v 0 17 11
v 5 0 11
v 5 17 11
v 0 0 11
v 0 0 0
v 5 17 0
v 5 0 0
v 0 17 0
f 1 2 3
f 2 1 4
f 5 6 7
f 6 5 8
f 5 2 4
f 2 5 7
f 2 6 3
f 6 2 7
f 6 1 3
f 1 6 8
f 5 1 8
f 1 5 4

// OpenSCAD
// Generated by SolidPython 1.0.1 on 2020-07-29 00:46:54


cube(size = [5, 17, 11]);
/***********************************************
*********      SolidPython code:      **********
************************************************
 
# import packages: SolidPython
from solid import *
from solid.utils import *
from itertools import chain, combinations, permutations


class Resize:

    def __init__(self, scad_file):
        self.scad_file = scad_file
        #self.scad_file = import_scad(scad_file)
        # cone/cylinder param:
        self.r1 = 0
        self.r2 = 0
        self.h = 0
        # rectangular prism param:
        self.w = 0
        self.l = 0
        # ellipse param:
        self.r = 0

    # import OpenScad code (file name corresponds to shape)


    # classify shape + parameters
    def assign(self, param1, param2, param3):
        if self.scad_file == 'cone.scad':
            self.r1 = param1
            self.r2 = param2
            self.h = param3
        elif self.scad_file == 'cylinder.scad':
            self.r1 = param1
            self.r2 = param2
            self.h = param3
        elif self.scad_file == 'rectangularPrism.scad':
            self.h = param1
            self.l = param2
            self.w = param3
        else:
            self.r = param1
            self.h = param2

    # resize parameters
    def iterate(self):
        x = range(3, 20, 2)
        i = 1
        if self.scad_file == 'cone.scad':
            tempList = list(permutations(x, 2))
            for temp in tempList:
                param1 = temp[0]
                param2 = temp[1]
                filepath = 'produced_scad_files/' + 'cone' + str(param1) + '_' + str(param2) + '_' + '.scad'
                scad_render_to_file(cylinder(h=param1, r1=param2, r2=0), filepath)

        elif self.scad_file == 'cylinder.scad':
            tempList = list(permutations(x, 3))
            for temp in tempList:
                param1 = temp[0]
                param2 = temp[1]
                filepath = 'produced_scad_files/' + 'cylinder' + str(param1) + '_' + str(param2) + '_' + '.scad'
                scad_render_to_file(cylinder(h=param1, r1=param2, r2=param2), filepath)

        elif self.scad_file == 'rectangularPrism.scad':
            tempList = list(permutations(x, 3))
            for temp in tempList:
                param1 = temp[0]
                param2 = temp[1]
                param3 = temp[2]
                filepath = 'produced_scad_files/' + 'rectangularPrism' + str(param1) + '_' + str(param2) + '_' + str(
                    param3) + '.scad'
                scad_render_to_file(cube(size=(param1, param2, param3)), filepath)

        elif self.scad_file == 'ellipse.scad':
            tempList = list(permutations(x, 4))
            for temp in tempList:
                param1 = temp[0]
                param2 = temp[1]
                param3 = temp[2]
                param4 = temp[3]
                filepath = 'produced_scad_files/' + 'ellipse' + str(param1) + '_' + str(param2) + '_' + str(param3) + '_' + str(param4) + '.scad'
                scad_render_to_file(scale([param1, param2, param3])(sphere(r=param4)), filepath)

    def render_to_scadfile(self):
        scad_render_to_file(scad, 'example.scad') 
 
************************************************/
